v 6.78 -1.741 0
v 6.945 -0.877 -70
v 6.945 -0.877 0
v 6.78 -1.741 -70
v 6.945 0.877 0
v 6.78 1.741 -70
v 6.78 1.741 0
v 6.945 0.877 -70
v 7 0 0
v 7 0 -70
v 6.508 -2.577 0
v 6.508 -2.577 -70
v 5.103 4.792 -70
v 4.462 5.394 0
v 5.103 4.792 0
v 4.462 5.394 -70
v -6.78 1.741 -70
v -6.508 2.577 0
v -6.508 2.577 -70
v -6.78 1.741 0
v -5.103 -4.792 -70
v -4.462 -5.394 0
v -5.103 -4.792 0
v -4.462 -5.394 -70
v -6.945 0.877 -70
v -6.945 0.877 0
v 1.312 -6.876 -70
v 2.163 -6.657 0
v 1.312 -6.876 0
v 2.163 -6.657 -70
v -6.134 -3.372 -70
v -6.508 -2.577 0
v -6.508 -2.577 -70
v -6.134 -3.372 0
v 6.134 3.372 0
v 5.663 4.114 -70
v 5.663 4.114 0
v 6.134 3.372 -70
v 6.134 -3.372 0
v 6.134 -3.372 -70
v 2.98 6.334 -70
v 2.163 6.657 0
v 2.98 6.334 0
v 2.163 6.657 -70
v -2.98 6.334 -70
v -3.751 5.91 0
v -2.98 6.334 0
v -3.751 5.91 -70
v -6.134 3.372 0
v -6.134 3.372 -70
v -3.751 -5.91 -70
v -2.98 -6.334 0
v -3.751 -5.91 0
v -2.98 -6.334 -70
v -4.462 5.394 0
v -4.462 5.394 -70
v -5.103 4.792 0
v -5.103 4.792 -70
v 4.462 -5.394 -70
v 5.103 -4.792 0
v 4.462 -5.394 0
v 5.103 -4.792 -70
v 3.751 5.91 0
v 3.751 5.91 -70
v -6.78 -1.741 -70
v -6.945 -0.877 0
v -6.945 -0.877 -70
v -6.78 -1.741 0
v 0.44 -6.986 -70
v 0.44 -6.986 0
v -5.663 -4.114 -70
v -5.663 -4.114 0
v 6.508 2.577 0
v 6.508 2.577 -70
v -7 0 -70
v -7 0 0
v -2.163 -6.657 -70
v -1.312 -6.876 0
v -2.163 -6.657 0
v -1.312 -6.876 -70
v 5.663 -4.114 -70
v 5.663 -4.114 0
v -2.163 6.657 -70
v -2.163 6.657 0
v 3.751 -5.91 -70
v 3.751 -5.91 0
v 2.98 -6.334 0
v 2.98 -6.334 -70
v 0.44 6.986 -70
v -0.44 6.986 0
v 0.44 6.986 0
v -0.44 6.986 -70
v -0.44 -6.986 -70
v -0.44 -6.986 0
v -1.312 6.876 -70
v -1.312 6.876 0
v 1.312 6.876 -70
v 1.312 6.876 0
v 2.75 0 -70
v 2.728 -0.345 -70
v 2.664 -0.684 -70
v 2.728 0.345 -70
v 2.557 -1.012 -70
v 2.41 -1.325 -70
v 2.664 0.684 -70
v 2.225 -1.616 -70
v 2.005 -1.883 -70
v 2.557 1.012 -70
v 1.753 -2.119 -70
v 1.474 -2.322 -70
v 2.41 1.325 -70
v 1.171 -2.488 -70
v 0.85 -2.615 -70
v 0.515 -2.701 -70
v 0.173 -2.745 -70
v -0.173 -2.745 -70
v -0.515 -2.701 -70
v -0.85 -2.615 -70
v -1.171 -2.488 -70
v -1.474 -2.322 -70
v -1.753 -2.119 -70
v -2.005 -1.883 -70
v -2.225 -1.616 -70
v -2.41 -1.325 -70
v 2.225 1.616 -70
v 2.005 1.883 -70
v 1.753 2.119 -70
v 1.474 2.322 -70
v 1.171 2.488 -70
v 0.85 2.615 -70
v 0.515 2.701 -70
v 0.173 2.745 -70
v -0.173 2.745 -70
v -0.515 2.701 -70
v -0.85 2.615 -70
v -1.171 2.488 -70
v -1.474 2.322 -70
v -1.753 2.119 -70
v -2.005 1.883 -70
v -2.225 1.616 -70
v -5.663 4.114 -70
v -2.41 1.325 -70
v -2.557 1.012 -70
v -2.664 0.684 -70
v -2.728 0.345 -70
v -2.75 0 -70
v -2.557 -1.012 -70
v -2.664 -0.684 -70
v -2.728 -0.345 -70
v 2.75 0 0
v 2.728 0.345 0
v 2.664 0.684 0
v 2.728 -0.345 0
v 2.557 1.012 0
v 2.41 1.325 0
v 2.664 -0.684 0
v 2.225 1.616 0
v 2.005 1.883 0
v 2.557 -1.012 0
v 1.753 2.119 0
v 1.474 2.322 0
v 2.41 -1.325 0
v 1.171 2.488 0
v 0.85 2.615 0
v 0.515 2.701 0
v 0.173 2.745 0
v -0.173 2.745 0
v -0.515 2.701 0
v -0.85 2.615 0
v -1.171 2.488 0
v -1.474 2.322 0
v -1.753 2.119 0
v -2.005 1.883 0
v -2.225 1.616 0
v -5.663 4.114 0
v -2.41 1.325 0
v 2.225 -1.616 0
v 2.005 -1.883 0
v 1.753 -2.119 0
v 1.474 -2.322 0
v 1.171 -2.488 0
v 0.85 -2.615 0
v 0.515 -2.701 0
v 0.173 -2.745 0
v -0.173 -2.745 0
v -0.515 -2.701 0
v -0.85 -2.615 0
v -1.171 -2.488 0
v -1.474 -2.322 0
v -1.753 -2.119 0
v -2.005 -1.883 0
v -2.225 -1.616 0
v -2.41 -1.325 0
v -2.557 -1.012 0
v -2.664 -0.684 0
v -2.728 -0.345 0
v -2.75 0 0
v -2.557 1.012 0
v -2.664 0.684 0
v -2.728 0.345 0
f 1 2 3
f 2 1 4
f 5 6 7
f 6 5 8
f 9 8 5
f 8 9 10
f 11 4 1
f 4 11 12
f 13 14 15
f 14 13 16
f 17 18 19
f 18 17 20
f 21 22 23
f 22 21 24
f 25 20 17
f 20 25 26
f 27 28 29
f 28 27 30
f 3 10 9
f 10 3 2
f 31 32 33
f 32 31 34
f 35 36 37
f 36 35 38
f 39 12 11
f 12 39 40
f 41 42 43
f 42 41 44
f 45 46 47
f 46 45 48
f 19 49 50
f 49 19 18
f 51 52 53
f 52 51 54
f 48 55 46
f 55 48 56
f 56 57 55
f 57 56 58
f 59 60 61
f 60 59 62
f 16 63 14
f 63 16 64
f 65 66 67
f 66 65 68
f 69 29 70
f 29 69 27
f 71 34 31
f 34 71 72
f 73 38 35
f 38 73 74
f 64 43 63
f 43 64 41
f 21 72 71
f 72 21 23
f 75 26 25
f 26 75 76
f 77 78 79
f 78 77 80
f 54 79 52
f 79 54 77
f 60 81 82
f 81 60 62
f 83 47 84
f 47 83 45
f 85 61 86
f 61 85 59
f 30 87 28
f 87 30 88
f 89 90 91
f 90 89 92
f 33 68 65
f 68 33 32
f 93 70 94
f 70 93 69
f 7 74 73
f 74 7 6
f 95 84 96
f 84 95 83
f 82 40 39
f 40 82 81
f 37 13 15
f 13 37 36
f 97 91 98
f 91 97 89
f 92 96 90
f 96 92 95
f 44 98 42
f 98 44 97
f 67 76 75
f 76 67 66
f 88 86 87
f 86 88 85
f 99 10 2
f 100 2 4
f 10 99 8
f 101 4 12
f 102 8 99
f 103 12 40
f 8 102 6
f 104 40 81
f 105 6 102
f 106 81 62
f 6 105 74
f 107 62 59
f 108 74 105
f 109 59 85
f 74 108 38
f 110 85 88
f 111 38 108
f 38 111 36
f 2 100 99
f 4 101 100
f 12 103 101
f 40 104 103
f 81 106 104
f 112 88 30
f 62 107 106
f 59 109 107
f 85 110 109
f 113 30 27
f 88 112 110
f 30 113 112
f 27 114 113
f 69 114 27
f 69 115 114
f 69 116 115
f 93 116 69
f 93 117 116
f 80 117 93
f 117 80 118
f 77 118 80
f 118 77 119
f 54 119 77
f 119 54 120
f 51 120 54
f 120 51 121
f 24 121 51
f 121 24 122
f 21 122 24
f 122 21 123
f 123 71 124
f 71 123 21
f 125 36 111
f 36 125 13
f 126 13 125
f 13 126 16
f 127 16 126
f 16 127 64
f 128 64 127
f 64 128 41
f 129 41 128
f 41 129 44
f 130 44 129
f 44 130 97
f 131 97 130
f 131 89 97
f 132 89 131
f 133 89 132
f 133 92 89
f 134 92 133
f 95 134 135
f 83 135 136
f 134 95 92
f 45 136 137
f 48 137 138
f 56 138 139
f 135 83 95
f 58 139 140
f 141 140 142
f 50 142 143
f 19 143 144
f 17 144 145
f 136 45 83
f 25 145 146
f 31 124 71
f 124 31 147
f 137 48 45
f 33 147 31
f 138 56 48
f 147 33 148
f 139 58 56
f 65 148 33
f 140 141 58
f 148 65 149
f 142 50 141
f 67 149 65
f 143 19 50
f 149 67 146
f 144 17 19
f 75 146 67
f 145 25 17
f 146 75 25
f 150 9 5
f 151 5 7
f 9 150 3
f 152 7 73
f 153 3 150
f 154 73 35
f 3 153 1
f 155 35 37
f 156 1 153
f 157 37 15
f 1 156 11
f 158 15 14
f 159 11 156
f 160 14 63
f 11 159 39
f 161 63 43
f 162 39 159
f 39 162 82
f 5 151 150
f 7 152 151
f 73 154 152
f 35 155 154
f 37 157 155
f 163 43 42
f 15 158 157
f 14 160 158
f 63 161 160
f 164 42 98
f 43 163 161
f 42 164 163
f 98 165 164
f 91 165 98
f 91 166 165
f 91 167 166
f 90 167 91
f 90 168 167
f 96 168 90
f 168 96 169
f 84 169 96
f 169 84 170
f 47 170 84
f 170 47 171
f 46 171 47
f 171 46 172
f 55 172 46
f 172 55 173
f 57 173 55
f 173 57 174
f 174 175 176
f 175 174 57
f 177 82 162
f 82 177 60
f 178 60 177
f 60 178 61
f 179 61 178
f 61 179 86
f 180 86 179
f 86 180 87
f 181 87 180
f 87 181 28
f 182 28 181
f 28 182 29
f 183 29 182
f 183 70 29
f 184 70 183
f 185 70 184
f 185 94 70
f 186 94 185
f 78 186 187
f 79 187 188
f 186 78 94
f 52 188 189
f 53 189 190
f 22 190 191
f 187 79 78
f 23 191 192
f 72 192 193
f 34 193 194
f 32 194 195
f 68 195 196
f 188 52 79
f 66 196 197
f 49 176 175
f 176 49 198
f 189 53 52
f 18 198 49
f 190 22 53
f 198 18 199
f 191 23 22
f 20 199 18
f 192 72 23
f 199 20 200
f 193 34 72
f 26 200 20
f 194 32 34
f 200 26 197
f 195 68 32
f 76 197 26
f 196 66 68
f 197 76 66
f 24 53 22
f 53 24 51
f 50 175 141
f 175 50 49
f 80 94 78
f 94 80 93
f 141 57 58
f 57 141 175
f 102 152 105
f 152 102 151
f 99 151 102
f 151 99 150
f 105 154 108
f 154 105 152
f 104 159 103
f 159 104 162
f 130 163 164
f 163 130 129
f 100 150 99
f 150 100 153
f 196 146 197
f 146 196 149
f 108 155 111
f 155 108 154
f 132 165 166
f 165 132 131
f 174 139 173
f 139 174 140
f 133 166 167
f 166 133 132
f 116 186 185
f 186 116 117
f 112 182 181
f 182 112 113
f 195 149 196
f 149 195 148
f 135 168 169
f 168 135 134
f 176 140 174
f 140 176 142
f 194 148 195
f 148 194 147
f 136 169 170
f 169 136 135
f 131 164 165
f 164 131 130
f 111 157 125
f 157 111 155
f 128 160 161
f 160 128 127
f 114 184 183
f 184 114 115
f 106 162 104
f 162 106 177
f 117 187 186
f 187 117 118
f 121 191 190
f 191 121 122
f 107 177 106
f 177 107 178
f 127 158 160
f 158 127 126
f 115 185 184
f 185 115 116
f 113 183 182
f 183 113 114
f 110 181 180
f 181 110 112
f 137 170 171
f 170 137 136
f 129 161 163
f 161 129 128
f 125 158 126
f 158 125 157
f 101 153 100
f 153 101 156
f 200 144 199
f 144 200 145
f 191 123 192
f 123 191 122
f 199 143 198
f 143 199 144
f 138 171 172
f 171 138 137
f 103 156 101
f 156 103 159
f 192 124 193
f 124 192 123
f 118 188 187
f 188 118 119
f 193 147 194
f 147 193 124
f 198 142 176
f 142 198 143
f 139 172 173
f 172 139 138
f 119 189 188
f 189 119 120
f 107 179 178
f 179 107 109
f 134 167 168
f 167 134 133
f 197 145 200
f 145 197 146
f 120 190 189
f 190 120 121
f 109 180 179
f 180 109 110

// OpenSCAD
$fn = 50;


difference() {
	union() {
		translate(v = [0, 0, -70.0000000000]) {
			cylinder(h = 70, r = 7.0000000000);
		}
		cylinder(h = 0, r = 13.0000000000);
	}
	union() {
		#translate(v = [0, 0, -70]) {
			cylinder(h = 70, r = 2.7500000000);
		}
	}
}
